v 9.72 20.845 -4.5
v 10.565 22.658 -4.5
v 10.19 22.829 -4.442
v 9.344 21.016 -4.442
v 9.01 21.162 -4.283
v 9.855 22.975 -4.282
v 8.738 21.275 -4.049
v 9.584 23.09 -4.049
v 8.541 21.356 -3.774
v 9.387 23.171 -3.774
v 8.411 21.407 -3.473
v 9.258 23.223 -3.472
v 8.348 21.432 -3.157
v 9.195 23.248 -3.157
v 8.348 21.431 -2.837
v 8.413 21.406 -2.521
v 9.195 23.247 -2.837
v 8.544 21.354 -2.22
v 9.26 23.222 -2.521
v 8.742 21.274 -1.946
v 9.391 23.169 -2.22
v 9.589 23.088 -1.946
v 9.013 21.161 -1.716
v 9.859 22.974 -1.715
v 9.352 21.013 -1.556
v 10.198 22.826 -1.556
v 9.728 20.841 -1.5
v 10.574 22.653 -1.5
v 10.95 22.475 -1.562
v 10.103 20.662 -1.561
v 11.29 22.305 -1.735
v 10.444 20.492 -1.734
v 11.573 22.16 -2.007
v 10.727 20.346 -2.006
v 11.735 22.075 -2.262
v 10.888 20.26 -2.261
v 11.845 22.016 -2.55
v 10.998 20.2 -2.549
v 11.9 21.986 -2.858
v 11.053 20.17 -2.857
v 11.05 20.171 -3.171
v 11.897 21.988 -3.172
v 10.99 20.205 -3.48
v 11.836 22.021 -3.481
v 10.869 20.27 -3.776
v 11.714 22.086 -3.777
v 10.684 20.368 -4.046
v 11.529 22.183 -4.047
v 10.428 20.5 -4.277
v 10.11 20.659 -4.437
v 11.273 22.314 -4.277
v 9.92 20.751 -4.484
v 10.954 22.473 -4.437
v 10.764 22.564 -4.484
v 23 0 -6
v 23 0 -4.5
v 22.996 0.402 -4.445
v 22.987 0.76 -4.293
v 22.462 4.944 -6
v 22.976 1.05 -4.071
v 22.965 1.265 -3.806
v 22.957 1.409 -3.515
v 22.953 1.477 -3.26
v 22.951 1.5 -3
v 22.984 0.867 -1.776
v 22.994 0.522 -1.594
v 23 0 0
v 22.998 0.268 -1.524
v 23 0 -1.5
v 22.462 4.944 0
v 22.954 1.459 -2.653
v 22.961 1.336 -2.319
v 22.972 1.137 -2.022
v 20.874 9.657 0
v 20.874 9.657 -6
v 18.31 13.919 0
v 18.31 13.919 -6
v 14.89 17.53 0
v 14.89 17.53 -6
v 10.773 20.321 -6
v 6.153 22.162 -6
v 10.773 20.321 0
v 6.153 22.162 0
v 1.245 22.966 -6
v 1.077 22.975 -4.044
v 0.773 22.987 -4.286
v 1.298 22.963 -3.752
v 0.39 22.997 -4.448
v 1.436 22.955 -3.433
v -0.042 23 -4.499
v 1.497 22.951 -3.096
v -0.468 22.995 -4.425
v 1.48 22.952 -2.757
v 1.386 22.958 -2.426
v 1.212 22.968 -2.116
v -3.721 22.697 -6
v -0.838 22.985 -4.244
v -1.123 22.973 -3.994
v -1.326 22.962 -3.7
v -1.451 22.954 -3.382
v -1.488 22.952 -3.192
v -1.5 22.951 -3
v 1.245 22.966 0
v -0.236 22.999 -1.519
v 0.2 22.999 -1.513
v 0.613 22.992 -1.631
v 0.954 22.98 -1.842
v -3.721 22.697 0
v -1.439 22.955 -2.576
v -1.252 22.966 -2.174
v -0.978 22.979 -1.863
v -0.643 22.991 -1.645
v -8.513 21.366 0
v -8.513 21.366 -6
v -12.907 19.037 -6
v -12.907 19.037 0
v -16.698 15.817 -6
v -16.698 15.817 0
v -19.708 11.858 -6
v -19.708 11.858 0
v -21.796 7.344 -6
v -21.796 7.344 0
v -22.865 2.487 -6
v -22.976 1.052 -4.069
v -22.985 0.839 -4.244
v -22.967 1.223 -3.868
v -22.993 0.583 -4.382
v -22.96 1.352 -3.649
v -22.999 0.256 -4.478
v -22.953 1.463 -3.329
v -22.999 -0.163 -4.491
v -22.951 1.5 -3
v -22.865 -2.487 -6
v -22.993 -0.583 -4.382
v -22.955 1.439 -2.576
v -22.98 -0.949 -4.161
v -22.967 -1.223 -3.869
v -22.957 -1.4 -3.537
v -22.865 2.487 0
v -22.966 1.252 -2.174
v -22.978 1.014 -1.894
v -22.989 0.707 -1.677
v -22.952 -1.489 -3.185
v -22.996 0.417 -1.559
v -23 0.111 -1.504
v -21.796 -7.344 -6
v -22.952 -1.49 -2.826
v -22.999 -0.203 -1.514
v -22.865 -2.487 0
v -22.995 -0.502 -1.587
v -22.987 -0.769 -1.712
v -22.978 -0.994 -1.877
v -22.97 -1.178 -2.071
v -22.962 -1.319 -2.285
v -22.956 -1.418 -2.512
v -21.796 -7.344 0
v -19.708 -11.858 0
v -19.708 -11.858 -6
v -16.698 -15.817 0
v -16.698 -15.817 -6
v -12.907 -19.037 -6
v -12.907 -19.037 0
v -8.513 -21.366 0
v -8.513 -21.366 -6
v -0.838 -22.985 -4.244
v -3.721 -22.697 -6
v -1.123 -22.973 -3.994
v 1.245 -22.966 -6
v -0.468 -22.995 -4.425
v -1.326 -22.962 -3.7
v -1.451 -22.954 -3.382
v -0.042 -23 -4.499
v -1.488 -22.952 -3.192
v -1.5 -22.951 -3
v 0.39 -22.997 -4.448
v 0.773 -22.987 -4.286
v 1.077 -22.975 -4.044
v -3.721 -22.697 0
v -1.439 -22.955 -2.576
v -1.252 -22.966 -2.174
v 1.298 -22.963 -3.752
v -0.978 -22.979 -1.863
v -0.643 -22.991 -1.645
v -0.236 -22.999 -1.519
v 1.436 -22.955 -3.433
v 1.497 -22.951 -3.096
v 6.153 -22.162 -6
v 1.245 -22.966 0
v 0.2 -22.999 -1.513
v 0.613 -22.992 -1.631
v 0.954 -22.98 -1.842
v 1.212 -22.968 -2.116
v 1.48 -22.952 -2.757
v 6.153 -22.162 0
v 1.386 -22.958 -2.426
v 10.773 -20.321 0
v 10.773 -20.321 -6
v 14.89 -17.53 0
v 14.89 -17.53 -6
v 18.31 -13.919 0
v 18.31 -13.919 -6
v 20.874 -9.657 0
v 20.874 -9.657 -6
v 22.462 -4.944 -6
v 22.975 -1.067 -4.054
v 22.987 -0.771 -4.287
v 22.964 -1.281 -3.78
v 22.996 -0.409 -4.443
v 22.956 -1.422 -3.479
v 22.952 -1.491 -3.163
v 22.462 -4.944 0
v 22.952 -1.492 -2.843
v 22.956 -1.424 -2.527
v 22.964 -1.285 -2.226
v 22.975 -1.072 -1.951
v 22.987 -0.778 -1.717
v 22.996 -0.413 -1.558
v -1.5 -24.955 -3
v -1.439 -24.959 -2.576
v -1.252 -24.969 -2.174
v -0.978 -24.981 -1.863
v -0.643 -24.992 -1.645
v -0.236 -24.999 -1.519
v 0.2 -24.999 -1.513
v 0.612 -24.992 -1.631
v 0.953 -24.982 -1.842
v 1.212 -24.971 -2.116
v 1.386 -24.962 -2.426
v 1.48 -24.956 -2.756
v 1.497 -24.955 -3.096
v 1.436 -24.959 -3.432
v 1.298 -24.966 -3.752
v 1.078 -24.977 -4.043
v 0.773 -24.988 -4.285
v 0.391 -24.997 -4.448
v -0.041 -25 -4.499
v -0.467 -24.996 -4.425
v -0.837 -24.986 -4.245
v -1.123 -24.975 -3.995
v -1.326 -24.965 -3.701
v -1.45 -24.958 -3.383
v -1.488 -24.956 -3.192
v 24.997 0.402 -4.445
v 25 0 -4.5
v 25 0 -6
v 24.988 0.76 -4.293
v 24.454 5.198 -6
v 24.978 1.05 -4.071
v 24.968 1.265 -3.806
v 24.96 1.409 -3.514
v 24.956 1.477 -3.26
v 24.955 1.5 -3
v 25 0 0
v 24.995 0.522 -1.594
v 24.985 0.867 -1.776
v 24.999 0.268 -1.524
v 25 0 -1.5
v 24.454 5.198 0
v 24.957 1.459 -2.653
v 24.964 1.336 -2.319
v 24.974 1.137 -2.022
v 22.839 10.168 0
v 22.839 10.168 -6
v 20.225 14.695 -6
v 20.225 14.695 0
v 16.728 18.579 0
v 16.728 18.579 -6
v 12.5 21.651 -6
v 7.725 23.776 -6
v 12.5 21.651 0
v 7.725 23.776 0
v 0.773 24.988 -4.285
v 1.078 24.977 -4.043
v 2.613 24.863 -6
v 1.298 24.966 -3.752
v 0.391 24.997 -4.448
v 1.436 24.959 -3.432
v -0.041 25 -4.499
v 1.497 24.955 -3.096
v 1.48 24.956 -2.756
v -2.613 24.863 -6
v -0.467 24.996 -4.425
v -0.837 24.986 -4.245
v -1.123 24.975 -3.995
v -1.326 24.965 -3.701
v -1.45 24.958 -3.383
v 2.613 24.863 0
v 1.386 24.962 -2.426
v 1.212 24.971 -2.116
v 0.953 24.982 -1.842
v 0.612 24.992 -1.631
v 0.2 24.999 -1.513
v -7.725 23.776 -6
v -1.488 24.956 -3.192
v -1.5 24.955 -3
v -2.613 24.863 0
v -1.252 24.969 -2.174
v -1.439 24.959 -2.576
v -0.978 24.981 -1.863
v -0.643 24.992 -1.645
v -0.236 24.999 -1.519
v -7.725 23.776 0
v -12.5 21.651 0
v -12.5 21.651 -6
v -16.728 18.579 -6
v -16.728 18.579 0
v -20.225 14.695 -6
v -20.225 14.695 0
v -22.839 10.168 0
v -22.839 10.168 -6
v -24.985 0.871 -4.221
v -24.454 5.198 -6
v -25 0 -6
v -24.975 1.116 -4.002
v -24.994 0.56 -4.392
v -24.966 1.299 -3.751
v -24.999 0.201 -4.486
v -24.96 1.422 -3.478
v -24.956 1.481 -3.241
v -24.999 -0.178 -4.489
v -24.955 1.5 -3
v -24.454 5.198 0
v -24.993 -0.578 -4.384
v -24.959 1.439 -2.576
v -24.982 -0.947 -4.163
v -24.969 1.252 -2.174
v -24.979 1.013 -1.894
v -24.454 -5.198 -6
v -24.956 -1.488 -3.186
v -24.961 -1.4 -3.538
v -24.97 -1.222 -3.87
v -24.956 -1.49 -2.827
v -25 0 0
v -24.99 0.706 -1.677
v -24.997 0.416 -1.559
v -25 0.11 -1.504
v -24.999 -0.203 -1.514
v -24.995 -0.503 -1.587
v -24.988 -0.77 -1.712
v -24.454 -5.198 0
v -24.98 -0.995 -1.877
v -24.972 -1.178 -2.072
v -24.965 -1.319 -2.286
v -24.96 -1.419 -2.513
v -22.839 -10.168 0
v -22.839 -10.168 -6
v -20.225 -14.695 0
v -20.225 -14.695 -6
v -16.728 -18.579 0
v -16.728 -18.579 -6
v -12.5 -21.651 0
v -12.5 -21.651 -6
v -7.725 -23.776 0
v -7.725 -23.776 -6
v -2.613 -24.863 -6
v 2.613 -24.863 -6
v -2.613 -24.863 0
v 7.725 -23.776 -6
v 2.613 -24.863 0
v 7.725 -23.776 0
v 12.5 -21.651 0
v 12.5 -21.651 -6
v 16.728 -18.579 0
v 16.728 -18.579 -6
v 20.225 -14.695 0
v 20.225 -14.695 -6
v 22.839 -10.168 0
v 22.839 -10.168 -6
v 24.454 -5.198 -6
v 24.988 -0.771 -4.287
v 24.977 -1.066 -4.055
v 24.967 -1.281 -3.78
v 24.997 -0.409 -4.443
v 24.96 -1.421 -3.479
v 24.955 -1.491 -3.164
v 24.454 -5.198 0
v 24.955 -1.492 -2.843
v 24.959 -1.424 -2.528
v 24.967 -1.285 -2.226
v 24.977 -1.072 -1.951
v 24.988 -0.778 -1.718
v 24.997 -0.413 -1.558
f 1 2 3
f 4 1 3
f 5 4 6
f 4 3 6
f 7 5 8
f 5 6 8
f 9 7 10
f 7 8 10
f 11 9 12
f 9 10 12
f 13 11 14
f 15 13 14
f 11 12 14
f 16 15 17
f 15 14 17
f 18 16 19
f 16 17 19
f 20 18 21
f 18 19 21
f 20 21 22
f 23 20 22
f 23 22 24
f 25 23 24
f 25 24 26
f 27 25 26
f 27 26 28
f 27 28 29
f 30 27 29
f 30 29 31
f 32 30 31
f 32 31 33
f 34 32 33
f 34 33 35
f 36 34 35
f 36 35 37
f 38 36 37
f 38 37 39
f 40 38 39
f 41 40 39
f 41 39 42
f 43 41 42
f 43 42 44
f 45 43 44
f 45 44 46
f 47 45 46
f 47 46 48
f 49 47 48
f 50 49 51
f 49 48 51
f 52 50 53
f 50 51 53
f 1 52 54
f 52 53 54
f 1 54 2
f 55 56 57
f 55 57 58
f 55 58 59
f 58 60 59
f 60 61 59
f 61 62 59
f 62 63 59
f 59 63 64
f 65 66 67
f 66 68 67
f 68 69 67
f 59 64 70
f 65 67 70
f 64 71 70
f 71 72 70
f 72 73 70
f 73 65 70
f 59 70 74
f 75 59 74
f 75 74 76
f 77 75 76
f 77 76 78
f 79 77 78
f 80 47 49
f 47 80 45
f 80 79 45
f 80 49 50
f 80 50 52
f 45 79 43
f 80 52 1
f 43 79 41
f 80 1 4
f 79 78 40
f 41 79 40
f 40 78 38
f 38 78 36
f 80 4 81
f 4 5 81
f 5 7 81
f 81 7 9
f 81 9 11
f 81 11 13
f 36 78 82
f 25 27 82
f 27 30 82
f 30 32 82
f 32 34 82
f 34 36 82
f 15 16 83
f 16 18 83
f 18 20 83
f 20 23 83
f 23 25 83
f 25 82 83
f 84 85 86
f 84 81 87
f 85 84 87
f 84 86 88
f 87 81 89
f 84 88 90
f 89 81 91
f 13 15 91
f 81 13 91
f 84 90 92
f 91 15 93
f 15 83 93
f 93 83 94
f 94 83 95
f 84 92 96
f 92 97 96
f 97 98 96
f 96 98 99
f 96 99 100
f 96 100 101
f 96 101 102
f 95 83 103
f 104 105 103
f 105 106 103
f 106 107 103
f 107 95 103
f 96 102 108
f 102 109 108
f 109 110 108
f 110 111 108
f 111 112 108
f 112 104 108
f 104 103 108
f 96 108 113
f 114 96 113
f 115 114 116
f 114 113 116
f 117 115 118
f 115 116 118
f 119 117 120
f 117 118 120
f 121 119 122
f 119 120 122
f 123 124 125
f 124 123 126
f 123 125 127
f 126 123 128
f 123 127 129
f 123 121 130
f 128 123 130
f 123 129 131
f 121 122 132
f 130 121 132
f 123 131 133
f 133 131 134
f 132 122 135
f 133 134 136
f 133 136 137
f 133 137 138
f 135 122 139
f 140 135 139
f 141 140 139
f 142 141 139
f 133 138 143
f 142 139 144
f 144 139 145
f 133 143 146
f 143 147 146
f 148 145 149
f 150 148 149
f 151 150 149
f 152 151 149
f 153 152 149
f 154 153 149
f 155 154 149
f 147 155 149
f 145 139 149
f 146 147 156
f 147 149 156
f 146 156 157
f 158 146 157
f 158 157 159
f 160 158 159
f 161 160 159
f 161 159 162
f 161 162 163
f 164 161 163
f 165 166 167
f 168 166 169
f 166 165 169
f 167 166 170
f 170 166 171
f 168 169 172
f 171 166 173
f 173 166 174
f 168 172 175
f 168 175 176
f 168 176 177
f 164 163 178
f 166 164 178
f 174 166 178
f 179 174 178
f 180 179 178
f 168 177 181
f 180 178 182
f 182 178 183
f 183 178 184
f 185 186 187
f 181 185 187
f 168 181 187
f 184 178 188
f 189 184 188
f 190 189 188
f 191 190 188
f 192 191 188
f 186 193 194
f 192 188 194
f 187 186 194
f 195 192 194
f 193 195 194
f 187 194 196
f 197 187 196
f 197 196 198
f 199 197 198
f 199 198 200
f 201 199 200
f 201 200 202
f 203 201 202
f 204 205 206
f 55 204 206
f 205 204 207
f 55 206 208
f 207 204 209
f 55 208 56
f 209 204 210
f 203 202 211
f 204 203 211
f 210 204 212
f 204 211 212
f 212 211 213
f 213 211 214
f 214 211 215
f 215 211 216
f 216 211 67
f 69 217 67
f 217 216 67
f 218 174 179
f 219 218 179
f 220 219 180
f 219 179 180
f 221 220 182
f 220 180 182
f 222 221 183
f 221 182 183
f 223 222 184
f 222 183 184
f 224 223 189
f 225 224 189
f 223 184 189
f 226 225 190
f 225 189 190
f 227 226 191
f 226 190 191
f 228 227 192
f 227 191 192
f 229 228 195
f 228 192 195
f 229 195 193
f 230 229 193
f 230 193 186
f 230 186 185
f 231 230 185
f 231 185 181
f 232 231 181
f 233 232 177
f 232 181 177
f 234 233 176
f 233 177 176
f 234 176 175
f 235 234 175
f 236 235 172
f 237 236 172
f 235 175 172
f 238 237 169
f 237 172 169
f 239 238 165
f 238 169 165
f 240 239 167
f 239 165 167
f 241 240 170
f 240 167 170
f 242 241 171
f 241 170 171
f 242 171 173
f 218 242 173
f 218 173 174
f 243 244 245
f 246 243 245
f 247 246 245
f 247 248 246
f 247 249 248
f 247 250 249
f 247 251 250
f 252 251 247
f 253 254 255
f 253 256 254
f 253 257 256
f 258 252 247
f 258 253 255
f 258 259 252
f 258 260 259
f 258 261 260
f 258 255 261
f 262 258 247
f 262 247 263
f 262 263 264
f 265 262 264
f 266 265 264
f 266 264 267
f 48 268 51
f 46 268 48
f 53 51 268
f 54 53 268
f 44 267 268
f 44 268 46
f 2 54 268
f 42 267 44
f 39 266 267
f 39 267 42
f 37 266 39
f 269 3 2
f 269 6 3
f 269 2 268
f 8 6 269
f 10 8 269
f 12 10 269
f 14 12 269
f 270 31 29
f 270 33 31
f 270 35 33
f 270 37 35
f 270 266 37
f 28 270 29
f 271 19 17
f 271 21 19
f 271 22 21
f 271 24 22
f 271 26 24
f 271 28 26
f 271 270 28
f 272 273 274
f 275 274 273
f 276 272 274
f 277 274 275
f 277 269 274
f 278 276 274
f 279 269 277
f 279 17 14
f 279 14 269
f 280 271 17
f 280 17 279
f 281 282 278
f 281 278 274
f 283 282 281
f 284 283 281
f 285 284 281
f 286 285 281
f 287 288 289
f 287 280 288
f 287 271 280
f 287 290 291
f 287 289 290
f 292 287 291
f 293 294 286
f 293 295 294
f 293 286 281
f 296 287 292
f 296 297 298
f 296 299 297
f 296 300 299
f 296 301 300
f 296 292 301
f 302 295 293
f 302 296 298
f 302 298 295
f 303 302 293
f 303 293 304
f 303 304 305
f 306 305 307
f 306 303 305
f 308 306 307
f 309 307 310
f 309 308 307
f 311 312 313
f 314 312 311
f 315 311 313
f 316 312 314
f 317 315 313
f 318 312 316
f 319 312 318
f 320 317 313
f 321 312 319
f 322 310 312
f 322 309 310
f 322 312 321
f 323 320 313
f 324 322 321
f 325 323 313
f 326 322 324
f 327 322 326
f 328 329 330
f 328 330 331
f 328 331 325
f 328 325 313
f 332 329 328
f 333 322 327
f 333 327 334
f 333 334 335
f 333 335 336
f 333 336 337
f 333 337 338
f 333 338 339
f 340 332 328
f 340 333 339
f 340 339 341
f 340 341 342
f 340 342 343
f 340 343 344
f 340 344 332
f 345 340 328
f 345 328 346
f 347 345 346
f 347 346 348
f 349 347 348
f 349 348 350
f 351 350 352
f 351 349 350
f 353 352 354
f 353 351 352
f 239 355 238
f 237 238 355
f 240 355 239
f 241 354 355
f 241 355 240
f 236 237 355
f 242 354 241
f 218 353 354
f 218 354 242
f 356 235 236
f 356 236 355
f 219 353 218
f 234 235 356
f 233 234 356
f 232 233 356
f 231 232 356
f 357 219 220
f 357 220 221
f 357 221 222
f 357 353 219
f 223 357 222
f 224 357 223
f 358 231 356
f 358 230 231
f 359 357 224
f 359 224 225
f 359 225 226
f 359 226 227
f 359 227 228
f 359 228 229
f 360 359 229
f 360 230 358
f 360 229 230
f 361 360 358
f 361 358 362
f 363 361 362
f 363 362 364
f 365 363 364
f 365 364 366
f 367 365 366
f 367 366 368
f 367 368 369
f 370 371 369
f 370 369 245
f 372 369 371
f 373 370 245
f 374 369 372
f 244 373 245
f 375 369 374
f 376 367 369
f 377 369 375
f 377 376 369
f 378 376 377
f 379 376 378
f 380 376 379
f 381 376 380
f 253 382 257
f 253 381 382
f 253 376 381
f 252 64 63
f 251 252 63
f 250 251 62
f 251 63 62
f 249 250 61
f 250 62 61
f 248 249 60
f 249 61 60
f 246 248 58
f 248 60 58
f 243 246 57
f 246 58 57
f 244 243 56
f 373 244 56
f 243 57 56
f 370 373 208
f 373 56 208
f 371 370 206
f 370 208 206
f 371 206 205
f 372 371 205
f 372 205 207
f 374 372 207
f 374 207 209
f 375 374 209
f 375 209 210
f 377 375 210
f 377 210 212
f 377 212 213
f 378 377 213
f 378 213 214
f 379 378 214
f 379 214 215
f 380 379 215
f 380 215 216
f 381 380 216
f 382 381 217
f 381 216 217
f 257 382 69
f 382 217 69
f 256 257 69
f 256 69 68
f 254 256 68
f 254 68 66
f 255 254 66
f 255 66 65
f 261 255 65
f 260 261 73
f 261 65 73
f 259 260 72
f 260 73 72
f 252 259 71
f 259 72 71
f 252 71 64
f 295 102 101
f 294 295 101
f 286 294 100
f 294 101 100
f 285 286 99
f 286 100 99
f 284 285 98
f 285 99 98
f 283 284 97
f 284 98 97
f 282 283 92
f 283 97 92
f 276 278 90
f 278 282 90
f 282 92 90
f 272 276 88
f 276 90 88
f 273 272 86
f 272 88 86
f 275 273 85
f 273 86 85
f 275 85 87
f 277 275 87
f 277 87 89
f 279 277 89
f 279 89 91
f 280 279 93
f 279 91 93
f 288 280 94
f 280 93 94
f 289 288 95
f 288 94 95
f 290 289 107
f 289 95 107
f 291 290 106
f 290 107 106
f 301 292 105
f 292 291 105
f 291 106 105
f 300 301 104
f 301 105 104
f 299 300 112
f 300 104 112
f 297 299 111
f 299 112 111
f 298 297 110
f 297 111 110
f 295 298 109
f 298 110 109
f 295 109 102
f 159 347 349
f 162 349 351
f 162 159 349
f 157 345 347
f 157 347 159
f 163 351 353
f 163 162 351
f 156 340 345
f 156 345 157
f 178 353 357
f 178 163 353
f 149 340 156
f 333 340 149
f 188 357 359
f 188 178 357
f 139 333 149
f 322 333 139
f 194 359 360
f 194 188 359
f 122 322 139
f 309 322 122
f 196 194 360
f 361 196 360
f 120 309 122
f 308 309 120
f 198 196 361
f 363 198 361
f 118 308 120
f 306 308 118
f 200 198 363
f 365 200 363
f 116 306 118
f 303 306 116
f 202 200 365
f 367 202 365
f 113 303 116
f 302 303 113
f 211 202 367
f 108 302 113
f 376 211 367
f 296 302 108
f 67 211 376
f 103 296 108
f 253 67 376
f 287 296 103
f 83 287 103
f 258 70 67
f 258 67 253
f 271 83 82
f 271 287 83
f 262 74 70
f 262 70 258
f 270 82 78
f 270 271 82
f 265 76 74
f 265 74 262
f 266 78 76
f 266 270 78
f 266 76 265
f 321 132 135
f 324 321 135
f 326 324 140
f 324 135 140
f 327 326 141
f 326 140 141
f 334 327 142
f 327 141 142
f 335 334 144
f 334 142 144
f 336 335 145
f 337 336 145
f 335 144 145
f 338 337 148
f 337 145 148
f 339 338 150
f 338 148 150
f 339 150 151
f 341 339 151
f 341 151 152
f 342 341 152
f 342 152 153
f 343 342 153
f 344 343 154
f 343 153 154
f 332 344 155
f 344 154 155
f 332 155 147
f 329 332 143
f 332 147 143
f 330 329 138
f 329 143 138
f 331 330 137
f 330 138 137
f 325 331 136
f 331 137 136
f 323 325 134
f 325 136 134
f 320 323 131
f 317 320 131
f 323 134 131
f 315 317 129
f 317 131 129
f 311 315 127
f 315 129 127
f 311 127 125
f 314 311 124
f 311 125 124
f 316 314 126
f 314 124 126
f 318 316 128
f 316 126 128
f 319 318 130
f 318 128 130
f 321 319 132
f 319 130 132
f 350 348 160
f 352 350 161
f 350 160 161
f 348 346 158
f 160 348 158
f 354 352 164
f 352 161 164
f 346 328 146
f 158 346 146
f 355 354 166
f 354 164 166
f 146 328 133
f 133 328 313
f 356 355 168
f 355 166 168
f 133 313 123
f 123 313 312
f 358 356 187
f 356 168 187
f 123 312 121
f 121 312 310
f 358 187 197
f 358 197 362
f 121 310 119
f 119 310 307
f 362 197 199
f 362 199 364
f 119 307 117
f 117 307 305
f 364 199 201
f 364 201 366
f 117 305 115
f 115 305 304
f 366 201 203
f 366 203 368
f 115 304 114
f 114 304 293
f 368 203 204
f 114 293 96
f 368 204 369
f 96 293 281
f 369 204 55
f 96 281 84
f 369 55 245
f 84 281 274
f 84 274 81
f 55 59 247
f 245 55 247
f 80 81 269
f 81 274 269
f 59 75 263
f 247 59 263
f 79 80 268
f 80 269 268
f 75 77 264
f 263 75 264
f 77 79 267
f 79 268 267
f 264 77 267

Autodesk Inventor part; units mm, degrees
ref_plane "YZ Plane" through (0, 0, 0) normal (1, 0, 0) x (0, 1, 0)
sketch "Sketch1" plane through (0, 0, 0) normal (0, 0, 1) x (1, 0, 0)
  circle A0 centre (0, 0) radius 23
  circle A1 centre (0, 0) radius 25
  dimension "d0" = 50
  dimension "d2" = 46
extrude "Extrusion1" add sketch "Sketch1" against normal blind 6
sketch "Sketch2" plane through (0, 0, 0) normal (0, 1, 0) x (-1, 0, 0)
  line L0 (-25, -6) -> (25, -6) projected
  circle A0 centre (0, -3) radius 1.5
  point P0 (0, 0)
  dimension "d5" = 3
  dimension "d6" = 3
extrude "Extrusion2" cut sketch "Sketch2" along normal through all both and the other way through all
sketch "Sketch3" plane through (0, 0, 0) normal (1, 0, 0) x (0, 1, 0)
  circle A0 centre (0, -3) radius 1.5
  line L0 (-25, 0) -> (25, 0) projected
  point P0 (0, 0)
  dimension "d9" = 3
  dimension "d10" = 3
extrude "Extrusion3" cut sketch "Sketch3" along normal through all both and the other way through all
ref_plane "Work Plane1" through (0, 0, 0) normal (0.4226, 0.9063, 0) x (0, 0, -1)
ref_plane "Work Plane2" through (10.5655, 22.6577, 0) normal (0.4226, 0.9063, 0) x (0, 0, -1)
sketch "Sketch5" plane through (10.5655, 22.6577, 0) normal (0.4226, 0.9063, 0) x (0, 0, -1)
  circle A0 centre (3, 0) radius 1.5
  line L0 (0, 25) -> (6, 25) projected
  point P0 (0, 0)
  point P1 (3, 25)
  dimension "d17" = 3
extrude "Extrusion4" cut sketch "Sketch5" against normal blind 10
properties part number "Ball Ring"
